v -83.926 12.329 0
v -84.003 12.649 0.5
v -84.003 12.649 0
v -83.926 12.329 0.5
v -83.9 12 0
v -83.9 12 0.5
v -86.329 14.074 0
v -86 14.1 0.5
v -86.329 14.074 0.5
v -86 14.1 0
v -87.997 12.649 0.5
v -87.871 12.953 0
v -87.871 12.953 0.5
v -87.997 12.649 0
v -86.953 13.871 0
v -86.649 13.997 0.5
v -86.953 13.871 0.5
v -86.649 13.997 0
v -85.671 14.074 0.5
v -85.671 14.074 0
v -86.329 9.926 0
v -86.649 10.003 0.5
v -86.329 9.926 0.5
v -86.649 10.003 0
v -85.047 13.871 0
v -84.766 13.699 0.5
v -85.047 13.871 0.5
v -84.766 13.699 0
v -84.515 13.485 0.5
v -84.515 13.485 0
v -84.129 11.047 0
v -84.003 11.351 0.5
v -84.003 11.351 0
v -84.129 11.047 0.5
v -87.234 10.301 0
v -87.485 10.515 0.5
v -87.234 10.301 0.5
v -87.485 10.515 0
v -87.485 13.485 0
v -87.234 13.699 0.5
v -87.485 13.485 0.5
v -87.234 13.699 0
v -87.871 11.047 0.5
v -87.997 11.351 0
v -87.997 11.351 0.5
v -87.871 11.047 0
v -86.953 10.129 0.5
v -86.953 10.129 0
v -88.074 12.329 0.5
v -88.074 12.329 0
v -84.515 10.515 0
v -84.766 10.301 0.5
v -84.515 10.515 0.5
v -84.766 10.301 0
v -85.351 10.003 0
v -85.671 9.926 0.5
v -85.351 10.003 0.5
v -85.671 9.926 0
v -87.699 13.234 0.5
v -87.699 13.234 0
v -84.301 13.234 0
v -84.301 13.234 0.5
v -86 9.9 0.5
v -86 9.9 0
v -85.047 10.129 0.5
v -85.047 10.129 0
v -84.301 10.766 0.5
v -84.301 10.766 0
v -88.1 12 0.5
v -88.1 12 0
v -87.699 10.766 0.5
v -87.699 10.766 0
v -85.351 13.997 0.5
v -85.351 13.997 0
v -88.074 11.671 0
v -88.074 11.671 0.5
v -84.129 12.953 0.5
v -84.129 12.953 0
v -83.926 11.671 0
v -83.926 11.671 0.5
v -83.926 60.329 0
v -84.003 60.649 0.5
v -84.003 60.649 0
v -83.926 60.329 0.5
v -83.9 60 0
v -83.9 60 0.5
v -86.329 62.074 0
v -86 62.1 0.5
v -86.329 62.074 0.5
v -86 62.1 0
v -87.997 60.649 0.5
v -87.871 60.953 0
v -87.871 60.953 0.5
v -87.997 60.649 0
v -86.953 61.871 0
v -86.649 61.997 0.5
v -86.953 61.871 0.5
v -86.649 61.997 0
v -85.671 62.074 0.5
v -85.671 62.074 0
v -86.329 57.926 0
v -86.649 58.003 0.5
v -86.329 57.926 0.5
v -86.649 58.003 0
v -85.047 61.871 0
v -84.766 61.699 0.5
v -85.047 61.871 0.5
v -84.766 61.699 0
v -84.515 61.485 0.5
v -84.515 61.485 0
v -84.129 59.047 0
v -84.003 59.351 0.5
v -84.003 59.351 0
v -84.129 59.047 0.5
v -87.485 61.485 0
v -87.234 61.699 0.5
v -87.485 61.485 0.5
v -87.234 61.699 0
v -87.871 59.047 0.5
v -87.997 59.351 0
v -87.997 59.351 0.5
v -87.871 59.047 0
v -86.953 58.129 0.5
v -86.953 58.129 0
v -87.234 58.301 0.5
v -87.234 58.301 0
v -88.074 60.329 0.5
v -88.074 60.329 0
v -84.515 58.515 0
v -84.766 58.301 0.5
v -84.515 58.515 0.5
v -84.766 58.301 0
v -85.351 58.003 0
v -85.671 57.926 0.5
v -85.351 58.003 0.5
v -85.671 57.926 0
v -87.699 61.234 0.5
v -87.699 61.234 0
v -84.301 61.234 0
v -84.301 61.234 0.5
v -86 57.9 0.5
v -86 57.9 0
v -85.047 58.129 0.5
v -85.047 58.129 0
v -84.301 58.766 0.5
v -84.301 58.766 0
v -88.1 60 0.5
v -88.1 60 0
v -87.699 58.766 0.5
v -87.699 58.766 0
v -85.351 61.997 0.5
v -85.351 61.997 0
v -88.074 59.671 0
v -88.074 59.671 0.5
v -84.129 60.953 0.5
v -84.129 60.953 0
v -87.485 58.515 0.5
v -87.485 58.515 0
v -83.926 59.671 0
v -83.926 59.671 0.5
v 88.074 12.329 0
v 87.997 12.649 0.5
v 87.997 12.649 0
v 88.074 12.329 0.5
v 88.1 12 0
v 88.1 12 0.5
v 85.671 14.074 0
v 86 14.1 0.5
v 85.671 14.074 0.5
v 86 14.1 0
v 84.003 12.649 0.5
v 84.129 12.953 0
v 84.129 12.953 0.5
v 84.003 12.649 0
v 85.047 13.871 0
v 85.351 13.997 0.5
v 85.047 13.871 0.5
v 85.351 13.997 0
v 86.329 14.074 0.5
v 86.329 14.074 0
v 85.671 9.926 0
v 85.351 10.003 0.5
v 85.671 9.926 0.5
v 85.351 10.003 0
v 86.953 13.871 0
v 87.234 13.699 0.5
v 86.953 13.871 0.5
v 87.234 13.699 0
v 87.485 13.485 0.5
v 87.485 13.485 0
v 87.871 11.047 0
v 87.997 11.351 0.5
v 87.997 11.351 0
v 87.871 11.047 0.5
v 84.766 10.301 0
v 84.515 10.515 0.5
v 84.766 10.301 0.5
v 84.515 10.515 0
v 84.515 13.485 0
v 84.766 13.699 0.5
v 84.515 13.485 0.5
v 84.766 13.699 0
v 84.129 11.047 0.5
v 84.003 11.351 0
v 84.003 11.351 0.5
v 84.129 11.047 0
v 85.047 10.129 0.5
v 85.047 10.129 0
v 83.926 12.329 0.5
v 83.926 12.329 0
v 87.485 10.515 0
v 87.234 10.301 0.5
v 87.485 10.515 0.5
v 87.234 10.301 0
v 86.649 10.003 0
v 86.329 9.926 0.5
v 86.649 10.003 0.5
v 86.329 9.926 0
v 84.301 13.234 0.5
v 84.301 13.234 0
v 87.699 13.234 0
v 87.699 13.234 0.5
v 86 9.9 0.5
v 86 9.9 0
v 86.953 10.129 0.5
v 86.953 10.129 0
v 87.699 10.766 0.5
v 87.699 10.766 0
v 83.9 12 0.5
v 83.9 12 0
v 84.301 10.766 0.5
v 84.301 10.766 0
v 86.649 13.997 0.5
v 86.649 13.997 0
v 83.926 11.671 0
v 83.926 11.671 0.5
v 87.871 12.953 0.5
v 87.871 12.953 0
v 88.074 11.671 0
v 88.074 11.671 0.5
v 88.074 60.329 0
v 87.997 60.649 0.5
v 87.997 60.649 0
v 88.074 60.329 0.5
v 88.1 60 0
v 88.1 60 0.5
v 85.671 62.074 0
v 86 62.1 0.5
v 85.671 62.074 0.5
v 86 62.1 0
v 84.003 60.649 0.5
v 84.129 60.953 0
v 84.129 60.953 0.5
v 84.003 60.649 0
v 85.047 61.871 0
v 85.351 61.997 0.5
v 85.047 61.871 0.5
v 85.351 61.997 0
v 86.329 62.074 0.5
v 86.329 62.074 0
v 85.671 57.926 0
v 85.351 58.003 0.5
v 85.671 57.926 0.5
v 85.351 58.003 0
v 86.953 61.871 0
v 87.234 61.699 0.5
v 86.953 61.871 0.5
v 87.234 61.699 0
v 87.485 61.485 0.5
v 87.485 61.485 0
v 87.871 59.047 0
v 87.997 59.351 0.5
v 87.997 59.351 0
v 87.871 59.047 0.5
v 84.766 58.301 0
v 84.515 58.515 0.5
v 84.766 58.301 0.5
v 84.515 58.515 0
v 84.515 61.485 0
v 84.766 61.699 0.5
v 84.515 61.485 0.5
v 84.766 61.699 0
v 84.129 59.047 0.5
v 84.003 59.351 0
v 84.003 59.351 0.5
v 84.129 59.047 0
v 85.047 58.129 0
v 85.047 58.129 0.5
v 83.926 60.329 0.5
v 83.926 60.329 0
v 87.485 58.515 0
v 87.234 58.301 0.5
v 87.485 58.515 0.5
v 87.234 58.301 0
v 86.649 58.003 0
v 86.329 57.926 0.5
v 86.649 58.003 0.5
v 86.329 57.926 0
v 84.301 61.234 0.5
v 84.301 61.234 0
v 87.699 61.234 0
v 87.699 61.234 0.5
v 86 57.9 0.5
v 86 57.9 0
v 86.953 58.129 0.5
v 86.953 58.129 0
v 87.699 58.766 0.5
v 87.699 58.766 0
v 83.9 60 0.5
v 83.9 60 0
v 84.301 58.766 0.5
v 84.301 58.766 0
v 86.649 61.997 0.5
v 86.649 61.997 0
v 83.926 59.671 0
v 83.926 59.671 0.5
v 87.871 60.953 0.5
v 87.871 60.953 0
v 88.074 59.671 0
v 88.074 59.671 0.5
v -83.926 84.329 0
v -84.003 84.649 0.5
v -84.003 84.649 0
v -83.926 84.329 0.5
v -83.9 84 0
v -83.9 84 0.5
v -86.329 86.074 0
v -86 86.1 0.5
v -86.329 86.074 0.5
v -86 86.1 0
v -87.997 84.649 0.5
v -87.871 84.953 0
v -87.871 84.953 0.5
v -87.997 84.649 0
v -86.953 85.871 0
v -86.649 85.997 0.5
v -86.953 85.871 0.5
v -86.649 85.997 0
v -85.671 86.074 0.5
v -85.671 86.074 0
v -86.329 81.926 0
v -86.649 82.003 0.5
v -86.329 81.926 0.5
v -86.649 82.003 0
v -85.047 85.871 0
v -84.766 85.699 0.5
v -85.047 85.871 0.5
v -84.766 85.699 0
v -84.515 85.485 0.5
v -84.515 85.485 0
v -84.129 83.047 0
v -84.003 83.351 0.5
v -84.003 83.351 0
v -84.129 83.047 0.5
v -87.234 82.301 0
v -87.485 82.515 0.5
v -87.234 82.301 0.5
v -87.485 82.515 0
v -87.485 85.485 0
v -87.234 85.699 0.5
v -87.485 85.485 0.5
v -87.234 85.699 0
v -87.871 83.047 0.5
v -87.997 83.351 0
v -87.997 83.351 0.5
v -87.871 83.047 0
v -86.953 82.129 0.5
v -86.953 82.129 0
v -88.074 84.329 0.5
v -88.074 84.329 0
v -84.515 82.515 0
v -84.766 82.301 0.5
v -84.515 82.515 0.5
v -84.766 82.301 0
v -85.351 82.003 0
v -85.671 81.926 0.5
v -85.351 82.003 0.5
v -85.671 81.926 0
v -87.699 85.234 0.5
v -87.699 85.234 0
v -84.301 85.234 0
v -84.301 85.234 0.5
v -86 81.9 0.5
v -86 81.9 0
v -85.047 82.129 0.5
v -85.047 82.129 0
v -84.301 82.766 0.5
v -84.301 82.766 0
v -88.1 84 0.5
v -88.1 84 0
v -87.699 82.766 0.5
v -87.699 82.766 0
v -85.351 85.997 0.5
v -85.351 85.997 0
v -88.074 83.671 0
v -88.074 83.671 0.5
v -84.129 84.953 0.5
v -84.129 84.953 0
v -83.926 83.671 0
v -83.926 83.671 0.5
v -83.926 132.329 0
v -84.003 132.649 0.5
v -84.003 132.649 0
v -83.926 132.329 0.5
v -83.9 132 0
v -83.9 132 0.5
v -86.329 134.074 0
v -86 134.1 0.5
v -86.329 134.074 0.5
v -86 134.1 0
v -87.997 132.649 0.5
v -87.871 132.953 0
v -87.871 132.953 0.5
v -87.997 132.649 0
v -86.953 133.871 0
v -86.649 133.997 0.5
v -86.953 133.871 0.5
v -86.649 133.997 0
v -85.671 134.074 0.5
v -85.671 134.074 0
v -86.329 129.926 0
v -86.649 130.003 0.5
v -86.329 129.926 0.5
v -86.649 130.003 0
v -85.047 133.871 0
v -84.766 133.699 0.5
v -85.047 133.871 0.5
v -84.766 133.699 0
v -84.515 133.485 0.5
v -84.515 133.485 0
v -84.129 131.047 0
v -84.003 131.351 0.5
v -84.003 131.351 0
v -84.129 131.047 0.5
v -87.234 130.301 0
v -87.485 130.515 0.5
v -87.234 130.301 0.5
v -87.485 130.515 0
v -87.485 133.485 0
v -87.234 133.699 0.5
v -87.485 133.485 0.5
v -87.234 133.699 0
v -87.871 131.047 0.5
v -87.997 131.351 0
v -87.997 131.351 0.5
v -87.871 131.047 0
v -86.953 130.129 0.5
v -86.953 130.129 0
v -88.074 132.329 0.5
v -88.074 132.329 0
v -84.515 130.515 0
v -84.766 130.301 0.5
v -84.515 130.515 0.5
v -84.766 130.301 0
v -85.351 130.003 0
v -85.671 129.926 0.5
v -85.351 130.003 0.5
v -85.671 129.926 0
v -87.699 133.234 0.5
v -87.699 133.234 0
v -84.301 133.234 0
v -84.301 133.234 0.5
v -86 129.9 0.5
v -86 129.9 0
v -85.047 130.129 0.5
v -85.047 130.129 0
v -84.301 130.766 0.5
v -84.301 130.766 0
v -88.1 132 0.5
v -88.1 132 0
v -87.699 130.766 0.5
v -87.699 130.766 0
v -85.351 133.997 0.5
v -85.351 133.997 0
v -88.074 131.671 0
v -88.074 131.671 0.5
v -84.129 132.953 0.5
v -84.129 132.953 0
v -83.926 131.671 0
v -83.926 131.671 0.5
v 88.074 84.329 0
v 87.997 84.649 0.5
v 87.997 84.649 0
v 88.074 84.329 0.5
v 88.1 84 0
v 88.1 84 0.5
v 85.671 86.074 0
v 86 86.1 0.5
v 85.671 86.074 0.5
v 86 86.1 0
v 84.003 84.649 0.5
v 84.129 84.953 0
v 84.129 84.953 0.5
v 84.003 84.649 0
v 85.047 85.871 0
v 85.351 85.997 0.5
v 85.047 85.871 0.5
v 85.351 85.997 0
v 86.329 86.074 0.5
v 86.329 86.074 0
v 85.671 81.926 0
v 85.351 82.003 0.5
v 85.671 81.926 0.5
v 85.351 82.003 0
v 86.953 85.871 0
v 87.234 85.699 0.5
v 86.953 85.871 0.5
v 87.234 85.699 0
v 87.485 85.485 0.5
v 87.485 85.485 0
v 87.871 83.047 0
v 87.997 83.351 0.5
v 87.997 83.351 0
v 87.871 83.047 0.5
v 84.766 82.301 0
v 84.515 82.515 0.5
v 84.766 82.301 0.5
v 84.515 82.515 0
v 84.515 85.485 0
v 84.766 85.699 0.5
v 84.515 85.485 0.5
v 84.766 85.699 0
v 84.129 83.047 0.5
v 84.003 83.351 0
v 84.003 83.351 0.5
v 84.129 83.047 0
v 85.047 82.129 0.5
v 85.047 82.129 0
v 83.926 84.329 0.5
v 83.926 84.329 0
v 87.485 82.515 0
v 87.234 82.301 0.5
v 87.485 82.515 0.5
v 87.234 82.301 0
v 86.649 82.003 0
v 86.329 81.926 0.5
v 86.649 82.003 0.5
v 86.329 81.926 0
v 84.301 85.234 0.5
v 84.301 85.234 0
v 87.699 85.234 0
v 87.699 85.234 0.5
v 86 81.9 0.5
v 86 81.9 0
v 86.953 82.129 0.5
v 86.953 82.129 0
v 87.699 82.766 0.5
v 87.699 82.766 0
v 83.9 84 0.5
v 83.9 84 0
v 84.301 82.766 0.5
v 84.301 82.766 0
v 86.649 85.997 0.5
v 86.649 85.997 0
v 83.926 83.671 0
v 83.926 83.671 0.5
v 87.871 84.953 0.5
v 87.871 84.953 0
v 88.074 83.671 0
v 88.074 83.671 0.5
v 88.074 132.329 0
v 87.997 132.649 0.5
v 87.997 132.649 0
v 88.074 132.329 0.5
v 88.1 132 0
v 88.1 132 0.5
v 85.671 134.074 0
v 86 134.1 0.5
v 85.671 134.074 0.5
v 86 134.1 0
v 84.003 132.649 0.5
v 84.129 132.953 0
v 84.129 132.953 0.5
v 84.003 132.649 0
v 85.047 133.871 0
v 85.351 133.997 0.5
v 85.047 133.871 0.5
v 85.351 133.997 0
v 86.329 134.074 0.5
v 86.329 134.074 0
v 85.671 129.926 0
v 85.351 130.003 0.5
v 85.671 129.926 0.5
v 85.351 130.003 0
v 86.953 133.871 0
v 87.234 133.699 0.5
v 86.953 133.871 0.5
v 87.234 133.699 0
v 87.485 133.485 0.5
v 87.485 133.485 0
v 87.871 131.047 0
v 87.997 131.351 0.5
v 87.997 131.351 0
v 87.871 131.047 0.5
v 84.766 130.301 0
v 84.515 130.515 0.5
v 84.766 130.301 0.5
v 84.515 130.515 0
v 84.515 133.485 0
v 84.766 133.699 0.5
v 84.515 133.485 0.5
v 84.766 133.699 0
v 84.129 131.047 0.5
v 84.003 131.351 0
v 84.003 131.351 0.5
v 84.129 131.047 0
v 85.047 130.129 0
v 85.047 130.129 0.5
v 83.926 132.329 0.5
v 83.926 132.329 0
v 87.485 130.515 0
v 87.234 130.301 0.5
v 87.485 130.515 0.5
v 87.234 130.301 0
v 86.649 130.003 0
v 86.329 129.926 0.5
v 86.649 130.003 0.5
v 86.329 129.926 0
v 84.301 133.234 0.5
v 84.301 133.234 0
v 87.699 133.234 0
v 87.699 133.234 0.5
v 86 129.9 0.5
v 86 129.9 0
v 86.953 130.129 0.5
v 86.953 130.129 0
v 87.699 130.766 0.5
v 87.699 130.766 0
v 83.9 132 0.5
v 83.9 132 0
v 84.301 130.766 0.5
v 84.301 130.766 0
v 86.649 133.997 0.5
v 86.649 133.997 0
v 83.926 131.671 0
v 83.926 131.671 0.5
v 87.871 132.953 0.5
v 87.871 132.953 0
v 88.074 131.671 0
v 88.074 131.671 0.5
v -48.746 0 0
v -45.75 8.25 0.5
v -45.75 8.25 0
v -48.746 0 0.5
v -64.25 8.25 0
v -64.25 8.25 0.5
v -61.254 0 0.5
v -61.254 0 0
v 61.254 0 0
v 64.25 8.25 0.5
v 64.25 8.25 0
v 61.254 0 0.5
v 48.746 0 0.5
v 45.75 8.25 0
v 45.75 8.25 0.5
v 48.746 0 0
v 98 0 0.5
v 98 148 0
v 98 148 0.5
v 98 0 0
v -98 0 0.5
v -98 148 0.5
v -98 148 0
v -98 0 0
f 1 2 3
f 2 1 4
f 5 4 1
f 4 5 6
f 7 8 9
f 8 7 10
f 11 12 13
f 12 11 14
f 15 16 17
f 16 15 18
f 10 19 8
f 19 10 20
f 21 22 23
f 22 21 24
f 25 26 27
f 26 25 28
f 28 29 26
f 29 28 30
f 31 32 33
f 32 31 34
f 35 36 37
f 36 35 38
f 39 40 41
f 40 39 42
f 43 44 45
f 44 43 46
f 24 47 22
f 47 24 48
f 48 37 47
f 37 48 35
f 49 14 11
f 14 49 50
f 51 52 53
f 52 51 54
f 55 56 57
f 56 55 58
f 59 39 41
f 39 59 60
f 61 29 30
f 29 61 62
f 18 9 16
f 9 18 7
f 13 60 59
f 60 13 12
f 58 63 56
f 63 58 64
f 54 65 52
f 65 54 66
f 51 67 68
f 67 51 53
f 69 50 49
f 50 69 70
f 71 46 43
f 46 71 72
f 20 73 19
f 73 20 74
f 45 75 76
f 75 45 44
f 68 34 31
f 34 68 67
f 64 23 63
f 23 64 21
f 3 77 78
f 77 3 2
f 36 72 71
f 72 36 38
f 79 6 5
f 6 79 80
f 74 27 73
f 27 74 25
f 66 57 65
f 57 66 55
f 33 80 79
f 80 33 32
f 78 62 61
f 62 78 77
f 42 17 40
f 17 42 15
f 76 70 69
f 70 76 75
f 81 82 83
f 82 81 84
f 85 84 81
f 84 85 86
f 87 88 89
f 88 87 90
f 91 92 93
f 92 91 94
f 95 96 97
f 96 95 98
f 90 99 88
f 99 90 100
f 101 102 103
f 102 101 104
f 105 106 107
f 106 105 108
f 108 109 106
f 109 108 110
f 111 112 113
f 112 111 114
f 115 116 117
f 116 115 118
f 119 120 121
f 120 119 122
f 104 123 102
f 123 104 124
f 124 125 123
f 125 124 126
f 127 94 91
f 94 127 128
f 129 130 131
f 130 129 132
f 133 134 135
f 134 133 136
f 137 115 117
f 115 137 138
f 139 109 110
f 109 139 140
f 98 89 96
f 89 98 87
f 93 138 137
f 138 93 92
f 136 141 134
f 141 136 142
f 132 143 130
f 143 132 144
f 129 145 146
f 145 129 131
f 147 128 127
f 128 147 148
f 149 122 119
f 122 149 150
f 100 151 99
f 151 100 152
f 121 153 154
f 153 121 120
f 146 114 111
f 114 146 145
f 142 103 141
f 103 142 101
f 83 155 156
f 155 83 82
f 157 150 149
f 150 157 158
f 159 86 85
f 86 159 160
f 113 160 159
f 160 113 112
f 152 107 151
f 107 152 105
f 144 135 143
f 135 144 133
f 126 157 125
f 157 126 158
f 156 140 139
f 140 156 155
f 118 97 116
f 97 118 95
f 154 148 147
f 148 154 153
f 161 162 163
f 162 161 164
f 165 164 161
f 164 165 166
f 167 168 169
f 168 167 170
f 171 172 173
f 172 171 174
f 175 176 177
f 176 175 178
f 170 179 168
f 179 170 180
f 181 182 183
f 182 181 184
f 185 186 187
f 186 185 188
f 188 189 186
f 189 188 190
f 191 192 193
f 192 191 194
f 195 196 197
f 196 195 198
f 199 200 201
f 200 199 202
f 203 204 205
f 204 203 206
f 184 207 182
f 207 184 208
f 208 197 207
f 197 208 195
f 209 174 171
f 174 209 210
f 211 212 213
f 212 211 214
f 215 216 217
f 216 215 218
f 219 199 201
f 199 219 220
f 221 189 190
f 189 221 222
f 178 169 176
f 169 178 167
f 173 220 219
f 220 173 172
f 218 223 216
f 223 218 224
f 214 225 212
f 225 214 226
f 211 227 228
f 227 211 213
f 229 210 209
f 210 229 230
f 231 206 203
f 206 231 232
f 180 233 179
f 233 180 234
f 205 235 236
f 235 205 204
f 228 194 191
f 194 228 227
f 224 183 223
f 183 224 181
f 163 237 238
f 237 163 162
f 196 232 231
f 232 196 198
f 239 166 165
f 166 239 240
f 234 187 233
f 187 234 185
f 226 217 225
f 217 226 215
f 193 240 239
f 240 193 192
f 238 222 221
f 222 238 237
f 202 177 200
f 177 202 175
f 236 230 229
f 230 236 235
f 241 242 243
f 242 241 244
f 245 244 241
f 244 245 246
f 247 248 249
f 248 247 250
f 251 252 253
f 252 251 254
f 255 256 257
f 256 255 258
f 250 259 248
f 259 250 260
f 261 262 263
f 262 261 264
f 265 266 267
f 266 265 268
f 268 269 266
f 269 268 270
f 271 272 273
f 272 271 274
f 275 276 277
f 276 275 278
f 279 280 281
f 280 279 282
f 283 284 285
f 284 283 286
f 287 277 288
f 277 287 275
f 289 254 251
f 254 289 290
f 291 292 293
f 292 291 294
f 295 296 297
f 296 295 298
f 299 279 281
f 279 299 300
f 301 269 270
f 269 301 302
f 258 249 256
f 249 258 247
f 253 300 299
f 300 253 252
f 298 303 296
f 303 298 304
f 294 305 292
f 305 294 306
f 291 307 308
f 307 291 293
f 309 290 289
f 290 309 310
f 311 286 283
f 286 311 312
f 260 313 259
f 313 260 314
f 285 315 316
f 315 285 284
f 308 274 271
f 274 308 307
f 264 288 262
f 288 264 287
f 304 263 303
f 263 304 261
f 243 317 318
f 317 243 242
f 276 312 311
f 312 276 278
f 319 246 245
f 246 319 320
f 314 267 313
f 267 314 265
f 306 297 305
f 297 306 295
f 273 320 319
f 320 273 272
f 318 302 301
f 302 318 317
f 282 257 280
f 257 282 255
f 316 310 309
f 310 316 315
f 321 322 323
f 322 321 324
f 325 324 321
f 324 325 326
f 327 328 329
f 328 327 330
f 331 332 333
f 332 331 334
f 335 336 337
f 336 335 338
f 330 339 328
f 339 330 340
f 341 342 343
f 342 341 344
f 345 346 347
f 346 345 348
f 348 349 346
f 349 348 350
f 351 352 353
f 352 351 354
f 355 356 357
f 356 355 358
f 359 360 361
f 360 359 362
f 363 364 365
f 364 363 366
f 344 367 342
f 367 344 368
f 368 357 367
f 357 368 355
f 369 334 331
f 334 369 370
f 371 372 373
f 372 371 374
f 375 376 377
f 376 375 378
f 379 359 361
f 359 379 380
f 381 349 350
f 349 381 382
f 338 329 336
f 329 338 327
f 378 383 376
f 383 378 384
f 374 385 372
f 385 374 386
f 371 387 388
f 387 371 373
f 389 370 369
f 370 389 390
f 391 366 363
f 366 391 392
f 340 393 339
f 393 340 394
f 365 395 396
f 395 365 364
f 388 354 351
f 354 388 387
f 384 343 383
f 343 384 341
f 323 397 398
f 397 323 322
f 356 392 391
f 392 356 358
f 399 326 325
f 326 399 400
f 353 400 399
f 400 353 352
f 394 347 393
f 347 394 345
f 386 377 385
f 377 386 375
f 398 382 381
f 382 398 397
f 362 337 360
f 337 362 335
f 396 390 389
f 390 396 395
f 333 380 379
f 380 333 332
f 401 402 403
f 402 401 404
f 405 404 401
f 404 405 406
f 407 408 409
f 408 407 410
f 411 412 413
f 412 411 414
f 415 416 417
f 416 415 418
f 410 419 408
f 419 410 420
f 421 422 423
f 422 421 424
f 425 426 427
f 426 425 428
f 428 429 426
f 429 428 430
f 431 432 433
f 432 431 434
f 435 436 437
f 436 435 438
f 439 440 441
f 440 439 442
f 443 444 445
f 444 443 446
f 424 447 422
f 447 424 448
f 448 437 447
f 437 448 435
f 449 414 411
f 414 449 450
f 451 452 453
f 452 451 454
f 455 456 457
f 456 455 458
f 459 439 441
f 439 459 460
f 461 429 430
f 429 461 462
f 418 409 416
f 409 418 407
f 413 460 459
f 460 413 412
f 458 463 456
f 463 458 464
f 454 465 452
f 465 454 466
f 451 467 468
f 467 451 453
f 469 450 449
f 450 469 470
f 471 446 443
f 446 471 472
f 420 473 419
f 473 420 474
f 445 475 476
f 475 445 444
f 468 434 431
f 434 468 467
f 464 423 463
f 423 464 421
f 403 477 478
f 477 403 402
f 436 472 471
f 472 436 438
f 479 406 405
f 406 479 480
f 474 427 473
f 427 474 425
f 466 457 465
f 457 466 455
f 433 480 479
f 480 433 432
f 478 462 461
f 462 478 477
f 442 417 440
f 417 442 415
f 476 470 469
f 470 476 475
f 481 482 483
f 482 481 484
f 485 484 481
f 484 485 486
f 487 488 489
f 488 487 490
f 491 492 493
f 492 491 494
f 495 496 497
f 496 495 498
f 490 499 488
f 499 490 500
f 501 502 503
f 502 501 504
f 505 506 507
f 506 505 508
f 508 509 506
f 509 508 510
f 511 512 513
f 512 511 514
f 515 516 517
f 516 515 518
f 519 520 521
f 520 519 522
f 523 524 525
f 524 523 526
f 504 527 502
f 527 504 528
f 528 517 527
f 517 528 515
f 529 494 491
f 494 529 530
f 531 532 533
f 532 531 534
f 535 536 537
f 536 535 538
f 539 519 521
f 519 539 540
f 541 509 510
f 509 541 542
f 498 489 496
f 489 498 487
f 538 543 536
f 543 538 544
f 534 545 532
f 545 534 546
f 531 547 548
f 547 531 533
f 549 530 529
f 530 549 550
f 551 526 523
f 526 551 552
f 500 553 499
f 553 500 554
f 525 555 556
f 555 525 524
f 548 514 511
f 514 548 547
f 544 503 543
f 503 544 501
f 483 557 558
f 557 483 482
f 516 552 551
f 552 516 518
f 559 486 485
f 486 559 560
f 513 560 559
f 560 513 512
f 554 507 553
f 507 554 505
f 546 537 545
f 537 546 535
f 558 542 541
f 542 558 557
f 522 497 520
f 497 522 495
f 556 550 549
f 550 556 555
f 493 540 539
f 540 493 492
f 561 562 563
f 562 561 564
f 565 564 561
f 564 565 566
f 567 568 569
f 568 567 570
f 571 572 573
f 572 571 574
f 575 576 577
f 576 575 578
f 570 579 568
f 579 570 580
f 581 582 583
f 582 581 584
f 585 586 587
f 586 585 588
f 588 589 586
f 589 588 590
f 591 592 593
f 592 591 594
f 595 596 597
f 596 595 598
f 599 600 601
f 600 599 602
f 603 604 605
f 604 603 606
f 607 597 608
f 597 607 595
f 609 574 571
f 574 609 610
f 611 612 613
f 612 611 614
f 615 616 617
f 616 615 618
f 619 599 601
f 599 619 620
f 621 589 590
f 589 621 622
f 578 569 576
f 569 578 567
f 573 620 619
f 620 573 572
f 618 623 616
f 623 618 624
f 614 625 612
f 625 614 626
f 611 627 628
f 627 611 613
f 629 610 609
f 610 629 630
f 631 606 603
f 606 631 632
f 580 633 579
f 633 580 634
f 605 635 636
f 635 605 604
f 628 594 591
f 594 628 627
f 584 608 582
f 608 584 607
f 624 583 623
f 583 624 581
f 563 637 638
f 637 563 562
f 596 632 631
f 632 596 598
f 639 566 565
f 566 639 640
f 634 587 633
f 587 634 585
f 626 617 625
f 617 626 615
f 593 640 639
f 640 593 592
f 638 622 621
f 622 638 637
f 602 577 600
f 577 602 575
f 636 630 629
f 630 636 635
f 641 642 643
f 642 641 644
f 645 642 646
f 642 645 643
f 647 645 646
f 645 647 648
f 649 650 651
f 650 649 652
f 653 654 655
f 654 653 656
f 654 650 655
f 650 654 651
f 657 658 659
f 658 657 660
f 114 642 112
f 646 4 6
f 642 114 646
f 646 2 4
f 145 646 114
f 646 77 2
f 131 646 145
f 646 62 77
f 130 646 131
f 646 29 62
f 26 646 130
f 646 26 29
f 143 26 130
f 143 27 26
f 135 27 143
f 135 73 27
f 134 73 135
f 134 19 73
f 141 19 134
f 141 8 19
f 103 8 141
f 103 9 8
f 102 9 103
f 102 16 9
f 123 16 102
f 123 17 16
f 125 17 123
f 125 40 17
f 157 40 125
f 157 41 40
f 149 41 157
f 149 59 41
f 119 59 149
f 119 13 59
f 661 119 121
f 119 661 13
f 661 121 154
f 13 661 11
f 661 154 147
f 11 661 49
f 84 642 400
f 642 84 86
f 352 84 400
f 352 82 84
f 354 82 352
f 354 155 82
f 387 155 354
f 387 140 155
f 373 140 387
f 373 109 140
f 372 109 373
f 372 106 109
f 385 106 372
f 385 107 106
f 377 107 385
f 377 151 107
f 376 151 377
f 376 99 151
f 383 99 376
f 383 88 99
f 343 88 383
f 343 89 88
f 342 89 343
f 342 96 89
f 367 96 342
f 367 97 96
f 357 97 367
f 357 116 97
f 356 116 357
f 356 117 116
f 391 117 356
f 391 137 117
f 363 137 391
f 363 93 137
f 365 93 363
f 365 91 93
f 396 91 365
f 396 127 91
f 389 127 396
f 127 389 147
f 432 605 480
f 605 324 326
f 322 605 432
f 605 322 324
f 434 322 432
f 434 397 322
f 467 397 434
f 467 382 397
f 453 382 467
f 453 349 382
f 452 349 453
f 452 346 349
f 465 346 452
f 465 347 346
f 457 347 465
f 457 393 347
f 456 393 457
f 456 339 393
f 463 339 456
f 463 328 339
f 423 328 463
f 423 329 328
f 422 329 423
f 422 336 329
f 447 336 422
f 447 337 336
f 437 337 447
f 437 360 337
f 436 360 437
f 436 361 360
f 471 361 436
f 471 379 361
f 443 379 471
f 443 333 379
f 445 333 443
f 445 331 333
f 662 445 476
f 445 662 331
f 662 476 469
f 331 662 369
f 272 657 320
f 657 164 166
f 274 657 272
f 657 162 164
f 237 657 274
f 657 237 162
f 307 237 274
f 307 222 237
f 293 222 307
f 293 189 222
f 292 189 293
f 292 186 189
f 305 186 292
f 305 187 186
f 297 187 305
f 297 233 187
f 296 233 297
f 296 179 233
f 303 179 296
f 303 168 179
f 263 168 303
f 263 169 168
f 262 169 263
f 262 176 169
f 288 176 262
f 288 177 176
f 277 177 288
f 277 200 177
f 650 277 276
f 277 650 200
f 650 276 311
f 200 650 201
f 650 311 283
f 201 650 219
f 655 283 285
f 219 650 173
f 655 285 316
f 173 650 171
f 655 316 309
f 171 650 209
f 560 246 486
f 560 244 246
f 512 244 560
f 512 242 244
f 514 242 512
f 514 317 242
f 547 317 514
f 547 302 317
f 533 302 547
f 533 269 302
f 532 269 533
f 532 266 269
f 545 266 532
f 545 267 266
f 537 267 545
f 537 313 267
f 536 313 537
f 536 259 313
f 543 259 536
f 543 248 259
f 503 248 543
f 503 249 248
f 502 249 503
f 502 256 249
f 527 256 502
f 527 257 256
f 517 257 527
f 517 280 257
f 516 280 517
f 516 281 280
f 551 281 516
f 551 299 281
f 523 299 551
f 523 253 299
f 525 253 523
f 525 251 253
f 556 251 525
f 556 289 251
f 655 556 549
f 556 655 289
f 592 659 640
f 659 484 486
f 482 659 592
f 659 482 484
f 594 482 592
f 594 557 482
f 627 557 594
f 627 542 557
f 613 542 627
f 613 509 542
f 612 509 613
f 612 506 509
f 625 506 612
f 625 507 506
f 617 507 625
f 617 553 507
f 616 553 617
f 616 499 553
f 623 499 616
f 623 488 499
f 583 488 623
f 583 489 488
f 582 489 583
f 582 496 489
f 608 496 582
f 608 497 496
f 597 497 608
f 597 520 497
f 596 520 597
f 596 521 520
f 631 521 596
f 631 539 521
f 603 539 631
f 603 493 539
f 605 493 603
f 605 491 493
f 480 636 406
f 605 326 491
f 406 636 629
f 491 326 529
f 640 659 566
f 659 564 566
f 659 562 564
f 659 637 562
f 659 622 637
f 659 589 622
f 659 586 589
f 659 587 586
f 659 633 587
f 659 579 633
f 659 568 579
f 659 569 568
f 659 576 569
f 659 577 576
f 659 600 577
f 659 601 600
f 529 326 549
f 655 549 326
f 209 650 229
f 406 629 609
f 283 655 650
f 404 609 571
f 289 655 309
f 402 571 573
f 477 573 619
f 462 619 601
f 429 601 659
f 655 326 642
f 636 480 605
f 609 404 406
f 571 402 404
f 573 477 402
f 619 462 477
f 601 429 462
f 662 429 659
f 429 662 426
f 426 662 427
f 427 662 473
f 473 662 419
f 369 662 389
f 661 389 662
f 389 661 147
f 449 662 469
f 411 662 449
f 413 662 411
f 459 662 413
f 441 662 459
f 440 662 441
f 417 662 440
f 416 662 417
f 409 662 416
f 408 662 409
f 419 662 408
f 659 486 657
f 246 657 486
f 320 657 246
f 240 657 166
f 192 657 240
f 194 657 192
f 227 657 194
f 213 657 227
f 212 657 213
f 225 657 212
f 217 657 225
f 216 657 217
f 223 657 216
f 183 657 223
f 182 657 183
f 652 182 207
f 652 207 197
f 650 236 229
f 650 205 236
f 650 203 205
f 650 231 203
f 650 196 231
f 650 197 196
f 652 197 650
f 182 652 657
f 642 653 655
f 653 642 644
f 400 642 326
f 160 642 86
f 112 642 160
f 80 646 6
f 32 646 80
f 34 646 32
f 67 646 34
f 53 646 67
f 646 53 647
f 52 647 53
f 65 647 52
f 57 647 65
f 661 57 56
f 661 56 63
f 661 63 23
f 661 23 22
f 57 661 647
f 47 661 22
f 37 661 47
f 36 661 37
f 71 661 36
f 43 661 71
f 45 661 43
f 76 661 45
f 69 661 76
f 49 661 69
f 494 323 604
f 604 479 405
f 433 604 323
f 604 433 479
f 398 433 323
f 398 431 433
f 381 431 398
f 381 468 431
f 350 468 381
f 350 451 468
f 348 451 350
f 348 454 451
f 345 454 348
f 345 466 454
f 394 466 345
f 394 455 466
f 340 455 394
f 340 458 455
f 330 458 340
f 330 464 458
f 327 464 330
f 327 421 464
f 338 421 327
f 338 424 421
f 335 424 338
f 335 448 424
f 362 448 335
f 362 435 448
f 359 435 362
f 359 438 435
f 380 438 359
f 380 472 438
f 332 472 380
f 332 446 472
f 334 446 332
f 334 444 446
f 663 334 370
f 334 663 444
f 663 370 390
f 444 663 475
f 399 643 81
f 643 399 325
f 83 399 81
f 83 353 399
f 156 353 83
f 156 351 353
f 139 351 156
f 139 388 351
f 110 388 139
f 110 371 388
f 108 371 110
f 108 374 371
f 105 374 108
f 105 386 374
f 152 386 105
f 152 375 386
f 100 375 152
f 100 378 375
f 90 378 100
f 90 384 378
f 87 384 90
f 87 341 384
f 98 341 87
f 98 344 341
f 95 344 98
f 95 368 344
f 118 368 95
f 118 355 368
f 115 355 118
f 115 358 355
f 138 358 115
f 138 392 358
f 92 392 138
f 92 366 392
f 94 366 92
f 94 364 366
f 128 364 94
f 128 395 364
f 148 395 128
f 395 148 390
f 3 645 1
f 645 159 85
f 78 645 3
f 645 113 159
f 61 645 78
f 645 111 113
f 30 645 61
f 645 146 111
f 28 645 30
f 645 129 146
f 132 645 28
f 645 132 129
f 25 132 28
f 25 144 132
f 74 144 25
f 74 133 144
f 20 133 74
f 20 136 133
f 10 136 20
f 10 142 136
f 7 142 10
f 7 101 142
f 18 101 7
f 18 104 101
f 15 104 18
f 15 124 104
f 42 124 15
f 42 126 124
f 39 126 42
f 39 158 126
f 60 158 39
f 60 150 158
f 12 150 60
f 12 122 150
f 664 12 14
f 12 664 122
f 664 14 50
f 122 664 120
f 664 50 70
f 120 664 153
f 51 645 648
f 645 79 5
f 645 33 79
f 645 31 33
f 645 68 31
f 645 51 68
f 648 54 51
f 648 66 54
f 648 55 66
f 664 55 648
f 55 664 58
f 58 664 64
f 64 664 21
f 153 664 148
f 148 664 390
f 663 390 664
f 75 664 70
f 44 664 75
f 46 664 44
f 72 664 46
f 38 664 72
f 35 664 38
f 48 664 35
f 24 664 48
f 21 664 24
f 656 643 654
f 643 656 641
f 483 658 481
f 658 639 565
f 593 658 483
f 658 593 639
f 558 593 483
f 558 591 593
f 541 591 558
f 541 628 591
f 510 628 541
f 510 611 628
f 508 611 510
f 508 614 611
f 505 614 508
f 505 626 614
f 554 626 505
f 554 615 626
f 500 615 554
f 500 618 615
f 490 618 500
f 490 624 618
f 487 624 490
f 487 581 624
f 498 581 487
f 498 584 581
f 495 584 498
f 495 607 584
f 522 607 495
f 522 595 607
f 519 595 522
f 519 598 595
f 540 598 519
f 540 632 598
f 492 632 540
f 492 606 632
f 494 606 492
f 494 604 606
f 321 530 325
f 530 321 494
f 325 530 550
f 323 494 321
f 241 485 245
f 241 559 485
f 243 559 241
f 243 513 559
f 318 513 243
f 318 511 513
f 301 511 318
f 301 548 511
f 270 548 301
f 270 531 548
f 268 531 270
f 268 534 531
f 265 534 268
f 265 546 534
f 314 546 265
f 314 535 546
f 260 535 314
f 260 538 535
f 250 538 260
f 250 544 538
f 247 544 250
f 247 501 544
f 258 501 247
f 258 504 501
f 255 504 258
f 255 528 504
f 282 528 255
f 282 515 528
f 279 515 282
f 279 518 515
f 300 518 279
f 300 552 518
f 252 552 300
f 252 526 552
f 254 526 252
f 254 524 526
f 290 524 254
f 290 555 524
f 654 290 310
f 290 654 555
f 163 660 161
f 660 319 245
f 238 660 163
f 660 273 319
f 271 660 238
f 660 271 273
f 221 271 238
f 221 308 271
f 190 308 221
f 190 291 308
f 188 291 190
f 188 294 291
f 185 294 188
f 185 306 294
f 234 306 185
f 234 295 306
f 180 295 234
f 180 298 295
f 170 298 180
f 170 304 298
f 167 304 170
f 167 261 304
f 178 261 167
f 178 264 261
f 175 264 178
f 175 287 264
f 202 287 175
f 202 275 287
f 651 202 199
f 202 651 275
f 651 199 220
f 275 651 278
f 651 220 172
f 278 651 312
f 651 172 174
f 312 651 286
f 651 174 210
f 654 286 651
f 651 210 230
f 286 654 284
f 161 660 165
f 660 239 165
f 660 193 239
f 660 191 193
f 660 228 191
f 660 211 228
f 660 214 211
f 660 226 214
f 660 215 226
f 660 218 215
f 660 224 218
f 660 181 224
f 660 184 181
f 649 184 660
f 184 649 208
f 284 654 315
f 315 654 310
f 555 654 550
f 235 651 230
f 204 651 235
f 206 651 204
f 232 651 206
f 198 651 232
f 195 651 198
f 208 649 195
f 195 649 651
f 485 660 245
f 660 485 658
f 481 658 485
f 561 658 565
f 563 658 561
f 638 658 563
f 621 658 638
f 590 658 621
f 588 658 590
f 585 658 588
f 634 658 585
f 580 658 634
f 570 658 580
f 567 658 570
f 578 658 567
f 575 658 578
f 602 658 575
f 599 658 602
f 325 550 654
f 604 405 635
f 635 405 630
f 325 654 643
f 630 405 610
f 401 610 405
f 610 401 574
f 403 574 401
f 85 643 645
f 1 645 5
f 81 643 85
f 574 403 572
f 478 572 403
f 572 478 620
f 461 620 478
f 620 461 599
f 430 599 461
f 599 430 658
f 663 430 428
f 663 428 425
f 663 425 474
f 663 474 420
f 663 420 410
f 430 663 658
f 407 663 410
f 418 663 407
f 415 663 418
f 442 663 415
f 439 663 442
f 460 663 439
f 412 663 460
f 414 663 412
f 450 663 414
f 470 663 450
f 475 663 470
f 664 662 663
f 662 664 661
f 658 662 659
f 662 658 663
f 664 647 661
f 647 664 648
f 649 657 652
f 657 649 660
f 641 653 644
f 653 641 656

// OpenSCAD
include <../lib/filament-spool-roller-lib.scad>;
$fn = 40;
floor_template_right();
